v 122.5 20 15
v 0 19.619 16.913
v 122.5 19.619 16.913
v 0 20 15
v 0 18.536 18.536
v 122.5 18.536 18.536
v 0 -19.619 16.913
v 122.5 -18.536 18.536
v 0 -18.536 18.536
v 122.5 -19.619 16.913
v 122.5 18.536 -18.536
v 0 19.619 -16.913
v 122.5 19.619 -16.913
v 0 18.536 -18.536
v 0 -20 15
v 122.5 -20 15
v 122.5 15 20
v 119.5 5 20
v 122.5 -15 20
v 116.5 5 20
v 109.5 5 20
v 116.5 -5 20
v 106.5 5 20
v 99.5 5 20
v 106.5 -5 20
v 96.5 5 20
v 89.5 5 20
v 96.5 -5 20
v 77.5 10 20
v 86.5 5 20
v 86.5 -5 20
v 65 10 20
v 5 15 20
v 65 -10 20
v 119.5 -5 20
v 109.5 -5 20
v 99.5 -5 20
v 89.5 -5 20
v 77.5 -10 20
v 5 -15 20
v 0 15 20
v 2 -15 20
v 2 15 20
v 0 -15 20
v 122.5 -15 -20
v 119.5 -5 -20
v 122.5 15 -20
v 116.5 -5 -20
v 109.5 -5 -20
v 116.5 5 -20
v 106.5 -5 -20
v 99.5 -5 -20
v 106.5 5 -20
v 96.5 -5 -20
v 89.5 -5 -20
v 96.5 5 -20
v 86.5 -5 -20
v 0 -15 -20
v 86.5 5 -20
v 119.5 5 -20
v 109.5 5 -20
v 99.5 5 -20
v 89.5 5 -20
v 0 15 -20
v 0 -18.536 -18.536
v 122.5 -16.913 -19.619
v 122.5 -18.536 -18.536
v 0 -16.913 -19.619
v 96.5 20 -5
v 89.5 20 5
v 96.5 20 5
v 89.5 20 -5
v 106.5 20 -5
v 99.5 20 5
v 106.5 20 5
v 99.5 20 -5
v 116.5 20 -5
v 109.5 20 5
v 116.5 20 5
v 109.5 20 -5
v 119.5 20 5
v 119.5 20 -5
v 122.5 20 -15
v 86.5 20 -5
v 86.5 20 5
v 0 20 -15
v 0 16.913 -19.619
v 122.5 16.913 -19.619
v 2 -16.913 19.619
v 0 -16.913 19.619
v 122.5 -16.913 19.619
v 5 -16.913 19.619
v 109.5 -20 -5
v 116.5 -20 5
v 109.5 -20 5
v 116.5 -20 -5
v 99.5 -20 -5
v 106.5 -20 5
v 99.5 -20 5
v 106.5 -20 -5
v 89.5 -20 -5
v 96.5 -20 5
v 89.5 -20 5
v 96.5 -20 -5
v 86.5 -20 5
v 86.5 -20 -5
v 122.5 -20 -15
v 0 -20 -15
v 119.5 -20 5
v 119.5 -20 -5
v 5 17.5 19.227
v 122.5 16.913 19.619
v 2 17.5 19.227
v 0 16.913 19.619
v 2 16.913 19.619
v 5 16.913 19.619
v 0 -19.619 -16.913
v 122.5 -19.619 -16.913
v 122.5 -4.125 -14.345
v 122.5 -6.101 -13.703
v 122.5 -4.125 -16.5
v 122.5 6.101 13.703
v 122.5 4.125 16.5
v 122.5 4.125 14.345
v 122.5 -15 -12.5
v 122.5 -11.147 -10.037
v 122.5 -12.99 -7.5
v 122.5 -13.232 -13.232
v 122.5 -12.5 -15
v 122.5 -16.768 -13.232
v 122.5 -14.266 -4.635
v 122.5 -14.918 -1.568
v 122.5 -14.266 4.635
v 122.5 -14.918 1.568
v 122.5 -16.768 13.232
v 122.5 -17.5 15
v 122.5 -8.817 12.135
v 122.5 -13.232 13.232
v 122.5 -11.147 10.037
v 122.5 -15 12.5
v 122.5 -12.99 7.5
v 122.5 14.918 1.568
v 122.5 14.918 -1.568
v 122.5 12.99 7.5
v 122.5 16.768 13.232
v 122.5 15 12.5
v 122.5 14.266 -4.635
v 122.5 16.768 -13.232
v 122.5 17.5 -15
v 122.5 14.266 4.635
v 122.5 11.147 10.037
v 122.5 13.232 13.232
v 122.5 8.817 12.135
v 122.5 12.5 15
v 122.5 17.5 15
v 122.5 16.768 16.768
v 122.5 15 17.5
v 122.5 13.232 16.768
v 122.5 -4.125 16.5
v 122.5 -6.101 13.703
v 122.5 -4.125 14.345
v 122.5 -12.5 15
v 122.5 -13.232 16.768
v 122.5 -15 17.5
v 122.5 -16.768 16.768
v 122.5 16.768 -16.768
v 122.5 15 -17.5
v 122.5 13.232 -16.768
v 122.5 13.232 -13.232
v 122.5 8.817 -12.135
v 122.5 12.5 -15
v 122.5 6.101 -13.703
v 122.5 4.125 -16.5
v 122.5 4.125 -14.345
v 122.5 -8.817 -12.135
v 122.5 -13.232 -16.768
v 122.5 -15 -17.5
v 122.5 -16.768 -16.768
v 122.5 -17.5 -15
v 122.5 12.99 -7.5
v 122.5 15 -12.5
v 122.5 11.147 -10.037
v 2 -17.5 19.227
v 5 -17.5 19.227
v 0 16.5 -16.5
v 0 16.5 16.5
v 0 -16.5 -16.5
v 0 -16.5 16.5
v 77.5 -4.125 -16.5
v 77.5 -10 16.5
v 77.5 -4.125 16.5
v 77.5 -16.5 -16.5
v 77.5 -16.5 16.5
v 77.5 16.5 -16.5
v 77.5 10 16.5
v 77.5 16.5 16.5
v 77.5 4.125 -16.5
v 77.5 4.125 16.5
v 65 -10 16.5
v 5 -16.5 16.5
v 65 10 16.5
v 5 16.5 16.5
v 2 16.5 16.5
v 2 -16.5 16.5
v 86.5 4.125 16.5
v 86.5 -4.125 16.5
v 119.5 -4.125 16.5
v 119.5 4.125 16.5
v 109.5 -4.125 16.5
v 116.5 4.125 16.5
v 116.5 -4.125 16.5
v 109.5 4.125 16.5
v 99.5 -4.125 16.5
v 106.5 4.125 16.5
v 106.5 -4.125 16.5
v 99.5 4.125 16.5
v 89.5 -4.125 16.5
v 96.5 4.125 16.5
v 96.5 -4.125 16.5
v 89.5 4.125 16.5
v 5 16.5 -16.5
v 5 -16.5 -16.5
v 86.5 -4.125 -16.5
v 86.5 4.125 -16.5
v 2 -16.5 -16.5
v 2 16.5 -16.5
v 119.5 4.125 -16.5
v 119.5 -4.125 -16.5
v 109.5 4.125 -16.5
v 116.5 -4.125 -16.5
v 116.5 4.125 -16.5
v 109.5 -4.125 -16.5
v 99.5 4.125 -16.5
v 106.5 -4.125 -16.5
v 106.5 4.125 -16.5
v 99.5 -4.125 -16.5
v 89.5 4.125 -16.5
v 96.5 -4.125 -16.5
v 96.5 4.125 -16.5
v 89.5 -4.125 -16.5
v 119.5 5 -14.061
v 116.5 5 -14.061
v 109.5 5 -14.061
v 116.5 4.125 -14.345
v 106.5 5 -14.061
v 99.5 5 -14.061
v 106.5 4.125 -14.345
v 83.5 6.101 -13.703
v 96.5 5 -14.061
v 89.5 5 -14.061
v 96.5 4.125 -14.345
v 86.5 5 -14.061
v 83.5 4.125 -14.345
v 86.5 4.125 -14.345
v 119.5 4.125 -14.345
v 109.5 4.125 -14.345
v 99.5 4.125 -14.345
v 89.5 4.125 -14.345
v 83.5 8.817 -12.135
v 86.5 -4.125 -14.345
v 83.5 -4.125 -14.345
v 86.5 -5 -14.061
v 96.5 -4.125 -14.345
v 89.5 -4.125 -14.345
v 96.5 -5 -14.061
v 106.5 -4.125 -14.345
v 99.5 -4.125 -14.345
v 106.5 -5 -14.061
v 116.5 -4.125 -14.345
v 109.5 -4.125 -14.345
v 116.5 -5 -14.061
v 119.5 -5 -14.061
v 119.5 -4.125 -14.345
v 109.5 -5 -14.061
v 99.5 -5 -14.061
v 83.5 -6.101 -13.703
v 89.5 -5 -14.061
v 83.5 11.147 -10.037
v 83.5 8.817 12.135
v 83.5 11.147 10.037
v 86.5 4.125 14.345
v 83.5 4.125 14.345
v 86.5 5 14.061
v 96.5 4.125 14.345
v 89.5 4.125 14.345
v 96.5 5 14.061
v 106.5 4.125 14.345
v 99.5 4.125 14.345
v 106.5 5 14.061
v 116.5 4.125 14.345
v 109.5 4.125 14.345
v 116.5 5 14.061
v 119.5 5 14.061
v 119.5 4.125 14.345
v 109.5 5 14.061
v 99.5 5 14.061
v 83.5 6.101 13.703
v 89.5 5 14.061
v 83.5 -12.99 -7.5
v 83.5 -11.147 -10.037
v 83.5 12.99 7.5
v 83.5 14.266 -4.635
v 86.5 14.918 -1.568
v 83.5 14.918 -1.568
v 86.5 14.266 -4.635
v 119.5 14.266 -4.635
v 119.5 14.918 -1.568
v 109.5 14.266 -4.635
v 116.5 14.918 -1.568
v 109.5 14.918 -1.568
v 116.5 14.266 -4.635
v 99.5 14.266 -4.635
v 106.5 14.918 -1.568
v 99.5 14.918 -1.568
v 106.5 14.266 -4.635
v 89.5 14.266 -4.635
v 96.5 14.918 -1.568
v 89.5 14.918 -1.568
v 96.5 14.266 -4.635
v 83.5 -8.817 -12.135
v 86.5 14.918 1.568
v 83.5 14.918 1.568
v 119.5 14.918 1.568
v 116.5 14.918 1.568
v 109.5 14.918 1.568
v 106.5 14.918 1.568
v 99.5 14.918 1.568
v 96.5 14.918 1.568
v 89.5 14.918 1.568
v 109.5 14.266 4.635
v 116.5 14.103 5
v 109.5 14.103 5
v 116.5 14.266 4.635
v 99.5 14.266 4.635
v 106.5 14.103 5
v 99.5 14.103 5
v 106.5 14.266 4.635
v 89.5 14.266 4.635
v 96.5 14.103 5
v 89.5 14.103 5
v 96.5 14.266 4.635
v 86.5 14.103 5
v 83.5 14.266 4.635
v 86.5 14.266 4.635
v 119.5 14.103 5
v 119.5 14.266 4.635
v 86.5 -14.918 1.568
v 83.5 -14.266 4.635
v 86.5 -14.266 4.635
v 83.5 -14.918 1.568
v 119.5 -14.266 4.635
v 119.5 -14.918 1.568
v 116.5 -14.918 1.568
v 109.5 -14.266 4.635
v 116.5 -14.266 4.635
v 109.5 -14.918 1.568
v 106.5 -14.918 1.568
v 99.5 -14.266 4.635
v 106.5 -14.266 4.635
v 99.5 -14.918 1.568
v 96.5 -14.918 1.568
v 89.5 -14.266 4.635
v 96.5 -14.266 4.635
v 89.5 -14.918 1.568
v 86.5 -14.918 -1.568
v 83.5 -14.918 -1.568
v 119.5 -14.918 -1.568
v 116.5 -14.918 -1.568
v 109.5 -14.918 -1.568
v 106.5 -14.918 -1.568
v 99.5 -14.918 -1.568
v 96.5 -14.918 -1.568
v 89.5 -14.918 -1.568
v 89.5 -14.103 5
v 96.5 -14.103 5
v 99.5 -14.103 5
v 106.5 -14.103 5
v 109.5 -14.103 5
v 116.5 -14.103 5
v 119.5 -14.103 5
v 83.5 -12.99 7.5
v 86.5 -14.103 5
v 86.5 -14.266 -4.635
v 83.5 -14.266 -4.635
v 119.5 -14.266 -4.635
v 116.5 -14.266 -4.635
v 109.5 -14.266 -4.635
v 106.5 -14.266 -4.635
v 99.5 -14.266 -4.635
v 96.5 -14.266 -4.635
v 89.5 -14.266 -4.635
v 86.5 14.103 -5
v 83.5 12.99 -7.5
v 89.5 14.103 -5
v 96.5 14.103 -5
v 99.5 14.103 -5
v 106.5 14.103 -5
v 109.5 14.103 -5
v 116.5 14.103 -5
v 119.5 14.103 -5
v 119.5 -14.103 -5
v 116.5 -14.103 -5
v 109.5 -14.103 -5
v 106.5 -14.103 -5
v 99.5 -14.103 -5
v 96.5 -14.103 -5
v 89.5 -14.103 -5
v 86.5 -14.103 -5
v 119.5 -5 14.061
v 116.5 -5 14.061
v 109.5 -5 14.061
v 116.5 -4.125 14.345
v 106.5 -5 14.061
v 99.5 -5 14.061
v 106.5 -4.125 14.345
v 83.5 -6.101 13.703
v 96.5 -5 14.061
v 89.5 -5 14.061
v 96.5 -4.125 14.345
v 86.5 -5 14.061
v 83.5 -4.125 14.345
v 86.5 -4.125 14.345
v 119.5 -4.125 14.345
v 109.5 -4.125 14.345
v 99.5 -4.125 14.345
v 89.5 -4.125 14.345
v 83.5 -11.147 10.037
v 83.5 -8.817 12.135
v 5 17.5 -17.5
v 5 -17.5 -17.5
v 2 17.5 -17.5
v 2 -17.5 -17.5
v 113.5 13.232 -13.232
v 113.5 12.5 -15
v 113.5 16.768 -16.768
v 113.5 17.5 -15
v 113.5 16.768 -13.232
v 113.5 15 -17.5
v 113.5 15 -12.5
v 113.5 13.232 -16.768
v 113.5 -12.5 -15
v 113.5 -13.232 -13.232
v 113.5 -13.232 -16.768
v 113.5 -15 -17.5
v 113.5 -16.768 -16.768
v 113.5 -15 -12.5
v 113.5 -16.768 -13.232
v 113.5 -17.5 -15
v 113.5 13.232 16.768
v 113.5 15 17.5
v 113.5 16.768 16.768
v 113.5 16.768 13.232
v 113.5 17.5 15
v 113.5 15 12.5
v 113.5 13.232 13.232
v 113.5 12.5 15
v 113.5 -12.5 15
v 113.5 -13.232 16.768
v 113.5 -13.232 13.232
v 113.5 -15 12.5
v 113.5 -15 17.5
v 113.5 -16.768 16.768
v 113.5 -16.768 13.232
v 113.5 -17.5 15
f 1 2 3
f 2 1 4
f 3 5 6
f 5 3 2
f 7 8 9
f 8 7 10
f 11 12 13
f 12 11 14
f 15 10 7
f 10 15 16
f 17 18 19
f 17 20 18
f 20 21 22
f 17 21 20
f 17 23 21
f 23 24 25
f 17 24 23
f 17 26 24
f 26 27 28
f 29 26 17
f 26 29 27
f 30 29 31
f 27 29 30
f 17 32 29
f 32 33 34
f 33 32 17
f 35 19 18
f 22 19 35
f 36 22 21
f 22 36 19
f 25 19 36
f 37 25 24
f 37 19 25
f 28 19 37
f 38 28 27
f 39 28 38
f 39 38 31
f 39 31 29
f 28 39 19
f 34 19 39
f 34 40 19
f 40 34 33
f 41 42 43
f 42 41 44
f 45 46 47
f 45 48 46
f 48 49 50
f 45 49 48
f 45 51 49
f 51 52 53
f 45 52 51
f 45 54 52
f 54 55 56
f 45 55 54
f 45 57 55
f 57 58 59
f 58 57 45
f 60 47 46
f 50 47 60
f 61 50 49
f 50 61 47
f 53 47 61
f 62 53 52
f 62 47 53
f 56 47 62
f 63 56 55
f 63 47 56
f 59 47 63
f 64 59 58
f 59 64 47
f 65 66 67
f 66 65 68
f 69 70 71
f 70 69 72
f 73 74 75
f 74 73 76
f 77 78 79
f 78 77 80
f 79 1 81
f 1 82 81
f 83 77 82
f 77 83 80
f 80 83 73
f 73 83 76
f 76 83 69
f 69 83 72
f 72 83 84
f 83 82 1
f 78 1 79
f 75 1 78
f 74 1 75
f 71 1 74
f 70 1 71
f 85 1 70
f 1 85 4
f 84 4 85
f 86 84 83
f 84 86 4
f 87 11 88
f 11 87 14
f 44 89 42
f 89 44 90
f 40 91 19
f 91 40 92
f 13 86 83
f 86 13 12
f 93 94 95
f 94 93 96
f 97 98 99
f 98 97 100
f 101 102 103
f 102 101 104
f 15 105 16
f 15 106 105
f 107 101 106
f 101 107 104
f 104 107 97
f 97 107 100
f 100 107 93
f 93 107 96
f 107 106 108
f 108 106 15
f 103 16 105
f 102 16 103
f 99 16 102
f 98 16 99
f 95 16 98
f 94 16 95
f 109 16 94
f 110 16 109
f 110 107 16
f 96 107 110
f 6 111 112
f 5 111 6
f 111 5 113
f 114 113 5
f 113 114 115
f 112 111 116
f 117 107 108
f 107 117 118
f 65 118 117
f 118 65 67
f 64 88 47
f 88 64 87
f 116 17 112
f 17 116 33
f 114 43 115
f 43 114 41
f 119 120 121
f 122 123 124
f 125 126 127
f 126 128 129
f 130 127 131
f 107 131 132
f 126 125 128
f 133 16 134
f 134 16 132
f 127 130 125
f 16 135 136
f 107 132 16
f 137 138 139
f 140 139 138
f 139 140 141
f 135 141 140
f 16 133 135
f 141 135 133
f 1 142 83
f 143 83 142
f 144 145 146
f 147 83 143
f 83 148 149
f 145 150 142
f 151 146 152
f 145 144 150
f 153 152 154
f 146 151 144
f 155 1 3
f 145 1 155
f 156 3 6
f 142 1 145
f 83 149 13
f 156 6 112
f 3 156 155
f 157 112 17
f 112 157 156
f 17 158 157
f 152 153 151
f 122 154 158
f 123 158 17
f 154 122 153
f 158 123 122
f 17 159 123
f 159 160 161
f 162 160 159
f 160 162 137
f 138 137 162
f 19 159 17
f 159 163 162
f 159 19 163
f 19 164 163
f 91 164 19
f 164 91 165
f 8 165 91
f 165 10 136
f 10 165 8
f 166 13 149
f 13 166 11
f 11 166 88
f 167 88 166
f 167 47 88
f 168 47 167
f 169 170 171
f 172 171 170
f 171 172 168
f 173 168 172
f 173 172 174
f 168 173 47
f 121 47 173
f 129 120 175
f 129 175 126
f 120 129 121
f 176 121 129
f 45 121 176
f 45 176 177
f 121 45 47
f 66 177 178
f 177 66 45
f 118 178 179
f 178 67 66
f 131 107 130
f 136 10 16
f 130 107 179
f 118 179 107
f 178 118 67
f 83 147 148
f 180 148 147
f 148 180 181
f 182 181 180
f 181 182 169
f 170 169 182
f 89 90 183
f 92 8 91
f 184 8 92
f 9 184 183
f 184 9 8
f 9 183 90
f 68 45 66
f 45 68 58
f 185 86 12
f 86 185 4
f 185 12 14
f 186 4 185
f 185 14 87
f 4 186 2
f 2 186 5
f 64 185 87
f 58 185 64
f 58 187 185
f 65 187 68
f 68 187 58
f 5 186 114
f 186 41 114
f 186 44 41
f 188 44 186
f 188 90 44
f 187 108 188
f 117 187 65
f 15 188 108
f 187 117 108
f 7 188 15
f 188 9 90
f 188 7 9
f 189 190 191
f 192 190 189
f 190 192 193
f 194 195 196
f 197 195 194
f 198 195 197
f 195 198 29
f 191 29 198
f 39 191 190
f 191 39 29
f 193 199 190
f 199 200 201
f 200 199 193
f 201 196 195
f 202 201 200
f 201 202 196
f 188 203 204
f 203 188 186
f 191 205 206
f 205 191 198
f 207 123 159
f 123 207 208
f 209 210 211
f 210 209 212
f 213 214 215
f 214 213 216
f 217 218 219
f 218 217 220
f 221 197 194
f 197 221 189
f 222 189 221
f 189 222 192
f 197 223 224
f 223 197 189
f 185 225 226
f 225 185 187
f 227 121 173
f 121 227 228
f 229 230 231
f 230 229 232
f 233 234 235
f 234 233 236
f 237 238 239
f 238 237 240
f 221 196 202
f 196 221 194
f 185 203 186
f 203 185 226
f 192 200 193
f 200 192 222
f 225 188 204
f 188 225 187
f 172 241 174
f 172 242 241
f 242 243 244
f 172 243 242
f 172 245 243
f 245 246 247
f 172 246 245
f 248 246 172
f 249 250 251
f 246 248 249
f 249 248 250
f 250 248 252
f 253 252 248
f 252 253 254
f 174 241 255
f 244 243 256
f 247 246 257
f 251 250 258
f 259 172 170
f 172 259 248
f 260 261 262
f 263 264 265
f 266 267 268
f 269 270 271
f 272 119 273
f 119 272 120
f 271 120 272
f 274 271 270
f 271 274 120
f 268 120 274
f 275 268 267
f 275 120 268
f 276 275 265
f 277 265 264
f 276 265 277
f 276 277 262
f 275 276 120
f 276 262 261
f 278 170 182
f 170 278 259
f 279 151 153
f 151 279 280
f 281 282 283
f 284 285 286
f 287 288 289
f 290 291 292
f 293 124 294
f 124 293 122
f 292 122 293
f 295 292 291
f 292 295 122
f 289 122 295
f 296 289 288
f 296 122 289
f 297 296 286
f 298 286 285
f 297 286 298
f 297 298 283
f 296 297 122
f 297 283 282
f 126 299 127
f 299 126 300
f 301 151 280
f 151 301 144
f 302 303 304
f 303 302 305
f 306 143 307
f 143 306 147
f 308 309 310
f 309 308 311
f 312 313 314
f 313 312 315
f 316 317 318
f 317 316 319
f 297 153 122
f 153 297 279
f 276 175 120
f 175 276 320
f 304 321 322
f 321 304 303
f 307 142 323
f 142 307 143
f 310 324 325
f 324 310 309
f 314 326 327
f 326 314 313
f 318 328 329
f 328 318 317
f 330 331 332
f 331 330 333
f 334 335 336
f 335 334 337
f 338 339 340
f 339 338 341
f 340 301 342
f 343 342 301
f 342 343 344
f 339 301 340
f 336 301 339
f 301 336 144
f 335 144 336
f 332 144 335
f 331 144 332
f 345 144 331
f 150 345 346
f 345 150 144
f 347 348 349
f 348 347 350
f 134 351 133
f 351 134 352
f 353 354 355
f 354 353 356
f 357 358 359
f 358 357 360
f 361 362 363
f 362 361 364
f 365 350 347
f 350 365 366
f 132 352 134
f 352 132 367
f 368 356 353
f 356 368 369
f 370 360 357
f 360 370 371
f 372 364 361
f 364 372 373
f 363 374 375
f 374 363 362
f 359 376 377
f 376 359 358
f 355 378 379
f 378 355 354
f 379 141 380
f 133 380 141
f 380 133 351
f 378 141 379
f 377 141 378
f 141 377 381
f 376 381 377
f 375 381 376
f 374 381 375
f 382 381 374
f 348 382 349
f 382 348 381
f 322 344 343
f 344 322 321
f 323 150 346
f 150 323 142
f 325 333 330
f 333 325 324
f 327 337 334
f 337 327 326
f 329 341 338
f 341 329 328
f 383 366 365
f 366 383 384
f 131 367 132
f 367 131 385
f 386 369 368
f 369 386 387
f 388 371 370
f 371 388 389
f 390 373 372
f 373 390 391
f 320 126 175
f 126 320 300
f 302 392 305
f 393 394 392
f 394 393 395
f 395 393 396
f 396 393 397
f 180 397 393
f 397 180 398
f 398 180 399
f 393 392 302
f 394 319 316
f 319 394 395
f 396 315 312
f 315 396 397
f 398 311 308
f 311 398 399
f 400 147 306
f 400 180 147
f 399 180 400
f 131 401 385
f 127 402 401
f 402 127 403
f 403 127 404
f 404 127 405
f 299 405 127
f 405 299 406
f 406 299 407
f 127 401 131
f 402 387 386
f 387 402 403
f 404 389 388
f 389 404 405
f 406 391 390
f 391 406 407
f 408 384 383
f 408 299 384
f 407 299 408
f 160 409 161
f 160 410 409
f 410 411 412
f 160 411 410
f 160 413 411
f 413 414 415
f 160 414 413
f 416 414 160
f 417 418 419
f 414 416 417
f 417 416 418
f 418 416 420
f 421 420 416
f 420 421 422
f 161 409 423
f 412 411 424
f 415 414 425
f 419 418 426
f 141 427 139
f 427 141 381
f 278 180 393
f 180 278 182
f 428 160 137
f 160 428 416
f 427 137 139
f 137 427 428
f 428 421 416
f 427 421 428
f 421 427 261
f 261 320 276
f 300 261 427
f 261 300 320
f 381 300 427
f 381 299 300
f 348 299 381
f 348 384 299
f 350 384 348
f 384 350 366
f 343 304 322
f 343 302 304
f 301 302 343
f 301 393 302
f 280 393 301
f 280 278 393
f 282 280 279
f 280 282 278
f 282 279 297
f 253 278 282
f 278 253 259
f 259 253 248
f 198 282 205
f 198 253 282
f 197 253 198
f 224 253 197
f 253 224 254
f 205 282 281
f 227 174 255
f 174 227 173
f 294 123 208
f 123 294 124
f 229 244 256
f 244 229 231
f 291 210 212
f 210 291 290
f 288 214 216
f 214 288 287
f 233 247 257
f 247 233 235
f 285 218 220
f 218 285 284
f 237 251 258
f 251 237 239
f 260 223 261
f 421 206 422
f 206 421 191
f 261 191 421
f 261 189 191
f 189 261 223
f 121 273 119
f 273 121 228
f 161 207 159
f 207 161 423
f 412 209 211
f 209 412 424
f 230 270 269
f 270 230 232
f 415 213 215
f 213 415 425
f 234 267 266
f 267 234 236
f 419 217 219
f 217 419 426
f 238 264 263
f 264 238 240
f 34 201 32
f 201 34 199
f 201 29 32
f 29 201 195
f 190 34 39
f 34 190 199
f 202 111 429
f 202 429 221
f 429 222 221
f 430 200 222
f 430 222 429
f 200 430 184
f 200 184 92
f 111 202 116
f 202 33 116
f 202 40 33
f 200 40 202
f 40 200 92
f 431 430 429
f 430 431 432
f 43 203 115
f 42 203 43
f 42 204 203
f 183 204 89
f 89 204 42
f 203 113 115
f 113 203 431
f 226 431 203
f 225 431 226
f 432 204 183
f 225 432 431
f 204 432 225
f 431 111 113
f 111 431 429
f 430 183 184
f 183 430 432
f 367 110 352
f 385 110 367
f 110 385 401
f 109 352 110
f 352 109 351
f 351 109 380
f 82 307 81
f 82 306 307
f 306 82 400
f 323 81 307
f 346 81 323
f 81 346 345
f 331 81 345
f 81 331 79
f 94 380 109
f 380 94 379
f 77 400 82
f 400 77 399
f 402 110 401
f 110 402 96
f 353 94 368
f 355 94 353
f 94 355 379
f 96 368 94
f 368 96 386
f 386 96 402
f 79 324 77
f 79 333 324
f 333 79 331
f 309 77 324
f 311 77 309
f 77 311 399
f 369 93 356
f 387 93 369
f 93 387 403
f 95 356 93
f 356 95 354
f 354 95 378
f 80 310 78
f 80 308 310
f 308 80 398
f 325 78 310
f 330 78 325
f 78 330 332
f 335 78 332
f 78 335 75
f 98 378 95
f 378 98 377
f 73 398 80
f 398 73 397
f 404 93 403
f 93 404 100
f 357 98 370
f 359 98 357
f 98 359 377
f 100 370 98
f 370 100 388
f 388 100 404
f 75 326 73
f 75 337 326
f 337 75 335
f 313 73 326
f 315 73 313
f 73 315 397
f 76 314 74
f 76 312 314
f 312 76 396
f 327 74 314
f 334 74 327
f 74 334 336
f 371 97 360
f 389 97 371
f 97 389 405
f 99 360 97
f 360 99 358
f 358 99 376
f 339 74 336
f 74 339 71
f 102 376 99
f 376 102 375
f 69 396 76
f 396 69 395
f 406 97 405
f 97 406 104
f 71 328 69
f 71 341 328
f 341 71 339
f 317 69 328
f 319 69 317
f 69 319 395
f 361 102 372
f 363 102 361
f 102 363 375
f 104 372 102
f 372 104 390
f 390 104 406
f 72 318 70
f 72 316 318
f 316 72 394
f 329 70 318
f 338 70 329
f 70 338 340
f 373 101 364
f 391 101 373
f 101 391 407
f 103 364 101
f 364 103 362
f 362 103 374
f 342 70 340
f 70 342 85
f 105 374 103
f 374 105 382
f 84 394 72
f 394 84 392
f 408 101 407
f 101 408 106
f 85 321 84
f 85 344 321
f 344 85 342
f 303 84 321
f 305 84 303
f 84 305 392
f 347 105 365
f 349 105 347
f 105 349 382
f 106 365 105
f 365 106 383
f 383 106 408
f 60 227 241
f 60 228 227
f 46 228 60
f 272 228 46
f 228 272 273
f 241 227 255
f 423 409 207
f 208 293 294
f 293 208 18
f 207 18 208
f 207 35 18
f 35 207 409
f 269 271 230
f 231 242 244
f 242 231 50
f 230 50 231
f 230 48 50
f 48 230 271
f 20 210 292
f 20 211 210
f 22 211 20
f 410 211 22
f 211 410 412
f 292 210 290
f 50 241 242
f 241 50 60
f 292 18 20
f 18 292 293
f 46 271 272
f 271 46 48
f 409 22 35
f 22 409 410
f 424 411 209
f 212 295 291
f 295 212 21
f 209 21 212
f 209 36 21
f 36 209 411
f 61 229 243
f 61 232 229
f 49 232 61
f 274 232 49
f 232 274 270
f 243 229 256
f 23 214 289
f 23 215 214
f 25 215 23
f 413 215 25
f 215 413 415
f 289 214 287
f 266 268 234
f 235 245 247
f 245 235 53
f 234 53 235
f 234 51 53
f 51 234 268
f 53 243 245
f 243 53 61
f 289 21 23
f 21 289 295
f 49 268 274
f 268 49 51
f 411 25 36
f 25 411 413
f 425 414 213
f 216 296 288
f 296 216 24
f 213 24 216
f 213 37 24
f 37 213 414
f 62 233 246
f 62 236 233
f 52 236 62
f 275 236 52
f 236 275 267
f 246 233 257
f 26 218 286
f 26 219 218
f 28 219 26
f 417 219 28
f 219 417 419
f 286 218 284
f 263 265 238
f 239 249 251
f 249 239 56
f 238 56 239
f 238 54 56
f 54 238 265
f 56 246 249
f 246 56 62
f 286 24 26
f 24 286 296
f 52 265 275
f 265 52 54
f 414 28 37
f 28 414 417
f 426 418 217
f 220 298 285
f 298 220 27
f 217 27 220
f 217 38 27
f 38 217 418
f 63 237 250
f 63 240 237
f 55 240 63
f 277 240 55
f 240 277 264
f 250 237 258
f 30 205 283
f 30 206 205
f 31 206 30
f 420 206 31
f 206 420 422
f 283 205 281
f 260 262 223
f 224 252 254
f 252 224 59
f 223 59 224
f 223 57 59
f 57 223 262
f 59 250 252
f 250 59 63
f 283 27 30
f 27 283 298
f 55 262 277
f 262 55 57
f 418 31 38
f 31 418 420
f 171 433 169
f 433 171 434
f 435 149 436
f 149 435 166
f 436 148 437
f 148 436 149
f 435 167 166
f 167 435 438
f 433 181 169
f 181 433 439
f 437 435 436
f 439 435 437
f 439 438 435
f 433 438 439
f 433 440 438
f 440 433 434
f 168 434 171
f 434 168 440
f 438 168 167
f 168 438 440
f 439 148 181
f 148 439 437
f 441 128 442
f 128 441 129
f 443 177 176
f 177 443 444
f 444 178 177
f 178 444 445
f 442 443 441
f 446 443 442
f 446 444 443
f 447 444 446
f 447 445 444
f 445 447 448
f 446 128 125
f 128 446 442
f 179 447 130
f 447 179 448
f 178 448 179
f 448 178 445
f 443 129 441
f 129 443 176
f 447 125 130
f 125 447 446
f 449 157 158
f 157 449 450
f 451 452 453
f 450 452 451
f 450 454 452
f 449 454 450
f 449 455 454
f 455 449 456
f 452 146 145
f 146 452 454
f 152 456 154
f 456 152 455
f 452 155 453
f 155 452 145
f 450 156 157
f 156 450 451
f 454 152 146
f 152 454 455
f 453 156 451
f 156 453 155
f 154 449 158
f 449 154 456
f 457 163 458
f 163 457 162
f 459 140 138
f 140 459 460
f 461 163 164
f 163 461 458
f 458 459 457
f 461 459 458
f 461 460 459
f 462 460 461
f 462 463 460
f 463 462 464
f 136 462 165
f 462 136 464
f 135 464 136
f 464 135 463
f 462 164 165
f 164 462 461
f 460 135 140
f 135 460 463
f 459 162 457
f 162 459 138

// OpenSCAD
// [FL_INDEX: keywords="openscad, 3d_parametric, Power_Stick_-_Good_for_Dremels__Fans__Blenders_and_More, csg_solid" | COT="Parametric OpenSCAD design from 3DCodeverse"]
// Title: Power Stick - Good for Dremels, Fans, Blenders and More!

//How long is your motor (mm)?
depth_motor = 40;
//What is the diameter of your motor(mm)?
dia_motor = 30;

//What is the width of your switch(mm)?
width_button = 12.5;
//What is the length of your switch(mm)?
length_button = 20;

//What is the width of your battery holder(mm)?
width_battery = 33;
//What is the length of your battery holder(mm)?
length_battery = 33;
//What is the height of your battery holder (how long is it)(mm)?
depth_battery = 60;


overall_length = depth_battery+depth_motor+width_button+10;

difference(){

hull(){
rotate([0,90,0])translate([-15,-15,0])cylinder(r = 5, h = overall_length, center = false);
rotate([0,90,0])translate([+15,-15,0])cylinder(r = 5, h = overall_length, center = false);
rotate([0,90,0])translate([-15,+15,0])cylinder(r = 5, h = overall_length, center = false);
rotate([0,90,0])translate([+15,+15,0])cylinder(r = 5, h = overall_length, center = false);
}

//minus
translate([-1,-width_battery/2,-length_battery/2])cube([depth_battery+width_button+6,width_battery,length_battery]);

rotate([0,90,0])translate([0,0,overall_length-depth_motor+1])cylinder(r = dia_motor/2, h = depth_motor, center = false);

translate([depth_battery+5,-width_battery/8,-length_battery/2])cube([depth_battery+5,width_battery/4,length_battery]);

translate([depth_battery+5,-length_button/2,1])cube([width_button,length_button,20]);

translate([2,-17.5,-17.5])cube([3,35,40]);

translate([overall_length-6,-25,-5])cube([3,50,10]);
translate([overall_length-16,-25,-5])cube([3,50,10]);
translate([overall_length-26,-25,-5])cube([3,50,10]);
translate([overall_length-36,-25,-5])cube([3,50,10]);

translate([overall_length-6,-5,-25])cube([3,10,50]);
translate([overall_length-16,-5,-25])cube([3,10,50]);
translate([overall_length-26,-5,-25])cube([3,10,50]);
translate([overall_length-36,-5,-25])cube([3,10,50]);

rotate([0,90,0])translate([15,15,overall_length-9])cylinder(r = 2.5, h = 10, center = false);
rotate([0,90,0])translate([15,-15,overall_length-9])cylinder(r = 2.5, h = 10, center = false);
rotate([0,90,0])translate([-15,15,overall_length-9])cylinder(r = 2.5, h = 10, center = false);
rotate([0,90,0])translate([-15,-15,overall_length-9])cylinder(r = 2.5, h = 10, center = false);
}
